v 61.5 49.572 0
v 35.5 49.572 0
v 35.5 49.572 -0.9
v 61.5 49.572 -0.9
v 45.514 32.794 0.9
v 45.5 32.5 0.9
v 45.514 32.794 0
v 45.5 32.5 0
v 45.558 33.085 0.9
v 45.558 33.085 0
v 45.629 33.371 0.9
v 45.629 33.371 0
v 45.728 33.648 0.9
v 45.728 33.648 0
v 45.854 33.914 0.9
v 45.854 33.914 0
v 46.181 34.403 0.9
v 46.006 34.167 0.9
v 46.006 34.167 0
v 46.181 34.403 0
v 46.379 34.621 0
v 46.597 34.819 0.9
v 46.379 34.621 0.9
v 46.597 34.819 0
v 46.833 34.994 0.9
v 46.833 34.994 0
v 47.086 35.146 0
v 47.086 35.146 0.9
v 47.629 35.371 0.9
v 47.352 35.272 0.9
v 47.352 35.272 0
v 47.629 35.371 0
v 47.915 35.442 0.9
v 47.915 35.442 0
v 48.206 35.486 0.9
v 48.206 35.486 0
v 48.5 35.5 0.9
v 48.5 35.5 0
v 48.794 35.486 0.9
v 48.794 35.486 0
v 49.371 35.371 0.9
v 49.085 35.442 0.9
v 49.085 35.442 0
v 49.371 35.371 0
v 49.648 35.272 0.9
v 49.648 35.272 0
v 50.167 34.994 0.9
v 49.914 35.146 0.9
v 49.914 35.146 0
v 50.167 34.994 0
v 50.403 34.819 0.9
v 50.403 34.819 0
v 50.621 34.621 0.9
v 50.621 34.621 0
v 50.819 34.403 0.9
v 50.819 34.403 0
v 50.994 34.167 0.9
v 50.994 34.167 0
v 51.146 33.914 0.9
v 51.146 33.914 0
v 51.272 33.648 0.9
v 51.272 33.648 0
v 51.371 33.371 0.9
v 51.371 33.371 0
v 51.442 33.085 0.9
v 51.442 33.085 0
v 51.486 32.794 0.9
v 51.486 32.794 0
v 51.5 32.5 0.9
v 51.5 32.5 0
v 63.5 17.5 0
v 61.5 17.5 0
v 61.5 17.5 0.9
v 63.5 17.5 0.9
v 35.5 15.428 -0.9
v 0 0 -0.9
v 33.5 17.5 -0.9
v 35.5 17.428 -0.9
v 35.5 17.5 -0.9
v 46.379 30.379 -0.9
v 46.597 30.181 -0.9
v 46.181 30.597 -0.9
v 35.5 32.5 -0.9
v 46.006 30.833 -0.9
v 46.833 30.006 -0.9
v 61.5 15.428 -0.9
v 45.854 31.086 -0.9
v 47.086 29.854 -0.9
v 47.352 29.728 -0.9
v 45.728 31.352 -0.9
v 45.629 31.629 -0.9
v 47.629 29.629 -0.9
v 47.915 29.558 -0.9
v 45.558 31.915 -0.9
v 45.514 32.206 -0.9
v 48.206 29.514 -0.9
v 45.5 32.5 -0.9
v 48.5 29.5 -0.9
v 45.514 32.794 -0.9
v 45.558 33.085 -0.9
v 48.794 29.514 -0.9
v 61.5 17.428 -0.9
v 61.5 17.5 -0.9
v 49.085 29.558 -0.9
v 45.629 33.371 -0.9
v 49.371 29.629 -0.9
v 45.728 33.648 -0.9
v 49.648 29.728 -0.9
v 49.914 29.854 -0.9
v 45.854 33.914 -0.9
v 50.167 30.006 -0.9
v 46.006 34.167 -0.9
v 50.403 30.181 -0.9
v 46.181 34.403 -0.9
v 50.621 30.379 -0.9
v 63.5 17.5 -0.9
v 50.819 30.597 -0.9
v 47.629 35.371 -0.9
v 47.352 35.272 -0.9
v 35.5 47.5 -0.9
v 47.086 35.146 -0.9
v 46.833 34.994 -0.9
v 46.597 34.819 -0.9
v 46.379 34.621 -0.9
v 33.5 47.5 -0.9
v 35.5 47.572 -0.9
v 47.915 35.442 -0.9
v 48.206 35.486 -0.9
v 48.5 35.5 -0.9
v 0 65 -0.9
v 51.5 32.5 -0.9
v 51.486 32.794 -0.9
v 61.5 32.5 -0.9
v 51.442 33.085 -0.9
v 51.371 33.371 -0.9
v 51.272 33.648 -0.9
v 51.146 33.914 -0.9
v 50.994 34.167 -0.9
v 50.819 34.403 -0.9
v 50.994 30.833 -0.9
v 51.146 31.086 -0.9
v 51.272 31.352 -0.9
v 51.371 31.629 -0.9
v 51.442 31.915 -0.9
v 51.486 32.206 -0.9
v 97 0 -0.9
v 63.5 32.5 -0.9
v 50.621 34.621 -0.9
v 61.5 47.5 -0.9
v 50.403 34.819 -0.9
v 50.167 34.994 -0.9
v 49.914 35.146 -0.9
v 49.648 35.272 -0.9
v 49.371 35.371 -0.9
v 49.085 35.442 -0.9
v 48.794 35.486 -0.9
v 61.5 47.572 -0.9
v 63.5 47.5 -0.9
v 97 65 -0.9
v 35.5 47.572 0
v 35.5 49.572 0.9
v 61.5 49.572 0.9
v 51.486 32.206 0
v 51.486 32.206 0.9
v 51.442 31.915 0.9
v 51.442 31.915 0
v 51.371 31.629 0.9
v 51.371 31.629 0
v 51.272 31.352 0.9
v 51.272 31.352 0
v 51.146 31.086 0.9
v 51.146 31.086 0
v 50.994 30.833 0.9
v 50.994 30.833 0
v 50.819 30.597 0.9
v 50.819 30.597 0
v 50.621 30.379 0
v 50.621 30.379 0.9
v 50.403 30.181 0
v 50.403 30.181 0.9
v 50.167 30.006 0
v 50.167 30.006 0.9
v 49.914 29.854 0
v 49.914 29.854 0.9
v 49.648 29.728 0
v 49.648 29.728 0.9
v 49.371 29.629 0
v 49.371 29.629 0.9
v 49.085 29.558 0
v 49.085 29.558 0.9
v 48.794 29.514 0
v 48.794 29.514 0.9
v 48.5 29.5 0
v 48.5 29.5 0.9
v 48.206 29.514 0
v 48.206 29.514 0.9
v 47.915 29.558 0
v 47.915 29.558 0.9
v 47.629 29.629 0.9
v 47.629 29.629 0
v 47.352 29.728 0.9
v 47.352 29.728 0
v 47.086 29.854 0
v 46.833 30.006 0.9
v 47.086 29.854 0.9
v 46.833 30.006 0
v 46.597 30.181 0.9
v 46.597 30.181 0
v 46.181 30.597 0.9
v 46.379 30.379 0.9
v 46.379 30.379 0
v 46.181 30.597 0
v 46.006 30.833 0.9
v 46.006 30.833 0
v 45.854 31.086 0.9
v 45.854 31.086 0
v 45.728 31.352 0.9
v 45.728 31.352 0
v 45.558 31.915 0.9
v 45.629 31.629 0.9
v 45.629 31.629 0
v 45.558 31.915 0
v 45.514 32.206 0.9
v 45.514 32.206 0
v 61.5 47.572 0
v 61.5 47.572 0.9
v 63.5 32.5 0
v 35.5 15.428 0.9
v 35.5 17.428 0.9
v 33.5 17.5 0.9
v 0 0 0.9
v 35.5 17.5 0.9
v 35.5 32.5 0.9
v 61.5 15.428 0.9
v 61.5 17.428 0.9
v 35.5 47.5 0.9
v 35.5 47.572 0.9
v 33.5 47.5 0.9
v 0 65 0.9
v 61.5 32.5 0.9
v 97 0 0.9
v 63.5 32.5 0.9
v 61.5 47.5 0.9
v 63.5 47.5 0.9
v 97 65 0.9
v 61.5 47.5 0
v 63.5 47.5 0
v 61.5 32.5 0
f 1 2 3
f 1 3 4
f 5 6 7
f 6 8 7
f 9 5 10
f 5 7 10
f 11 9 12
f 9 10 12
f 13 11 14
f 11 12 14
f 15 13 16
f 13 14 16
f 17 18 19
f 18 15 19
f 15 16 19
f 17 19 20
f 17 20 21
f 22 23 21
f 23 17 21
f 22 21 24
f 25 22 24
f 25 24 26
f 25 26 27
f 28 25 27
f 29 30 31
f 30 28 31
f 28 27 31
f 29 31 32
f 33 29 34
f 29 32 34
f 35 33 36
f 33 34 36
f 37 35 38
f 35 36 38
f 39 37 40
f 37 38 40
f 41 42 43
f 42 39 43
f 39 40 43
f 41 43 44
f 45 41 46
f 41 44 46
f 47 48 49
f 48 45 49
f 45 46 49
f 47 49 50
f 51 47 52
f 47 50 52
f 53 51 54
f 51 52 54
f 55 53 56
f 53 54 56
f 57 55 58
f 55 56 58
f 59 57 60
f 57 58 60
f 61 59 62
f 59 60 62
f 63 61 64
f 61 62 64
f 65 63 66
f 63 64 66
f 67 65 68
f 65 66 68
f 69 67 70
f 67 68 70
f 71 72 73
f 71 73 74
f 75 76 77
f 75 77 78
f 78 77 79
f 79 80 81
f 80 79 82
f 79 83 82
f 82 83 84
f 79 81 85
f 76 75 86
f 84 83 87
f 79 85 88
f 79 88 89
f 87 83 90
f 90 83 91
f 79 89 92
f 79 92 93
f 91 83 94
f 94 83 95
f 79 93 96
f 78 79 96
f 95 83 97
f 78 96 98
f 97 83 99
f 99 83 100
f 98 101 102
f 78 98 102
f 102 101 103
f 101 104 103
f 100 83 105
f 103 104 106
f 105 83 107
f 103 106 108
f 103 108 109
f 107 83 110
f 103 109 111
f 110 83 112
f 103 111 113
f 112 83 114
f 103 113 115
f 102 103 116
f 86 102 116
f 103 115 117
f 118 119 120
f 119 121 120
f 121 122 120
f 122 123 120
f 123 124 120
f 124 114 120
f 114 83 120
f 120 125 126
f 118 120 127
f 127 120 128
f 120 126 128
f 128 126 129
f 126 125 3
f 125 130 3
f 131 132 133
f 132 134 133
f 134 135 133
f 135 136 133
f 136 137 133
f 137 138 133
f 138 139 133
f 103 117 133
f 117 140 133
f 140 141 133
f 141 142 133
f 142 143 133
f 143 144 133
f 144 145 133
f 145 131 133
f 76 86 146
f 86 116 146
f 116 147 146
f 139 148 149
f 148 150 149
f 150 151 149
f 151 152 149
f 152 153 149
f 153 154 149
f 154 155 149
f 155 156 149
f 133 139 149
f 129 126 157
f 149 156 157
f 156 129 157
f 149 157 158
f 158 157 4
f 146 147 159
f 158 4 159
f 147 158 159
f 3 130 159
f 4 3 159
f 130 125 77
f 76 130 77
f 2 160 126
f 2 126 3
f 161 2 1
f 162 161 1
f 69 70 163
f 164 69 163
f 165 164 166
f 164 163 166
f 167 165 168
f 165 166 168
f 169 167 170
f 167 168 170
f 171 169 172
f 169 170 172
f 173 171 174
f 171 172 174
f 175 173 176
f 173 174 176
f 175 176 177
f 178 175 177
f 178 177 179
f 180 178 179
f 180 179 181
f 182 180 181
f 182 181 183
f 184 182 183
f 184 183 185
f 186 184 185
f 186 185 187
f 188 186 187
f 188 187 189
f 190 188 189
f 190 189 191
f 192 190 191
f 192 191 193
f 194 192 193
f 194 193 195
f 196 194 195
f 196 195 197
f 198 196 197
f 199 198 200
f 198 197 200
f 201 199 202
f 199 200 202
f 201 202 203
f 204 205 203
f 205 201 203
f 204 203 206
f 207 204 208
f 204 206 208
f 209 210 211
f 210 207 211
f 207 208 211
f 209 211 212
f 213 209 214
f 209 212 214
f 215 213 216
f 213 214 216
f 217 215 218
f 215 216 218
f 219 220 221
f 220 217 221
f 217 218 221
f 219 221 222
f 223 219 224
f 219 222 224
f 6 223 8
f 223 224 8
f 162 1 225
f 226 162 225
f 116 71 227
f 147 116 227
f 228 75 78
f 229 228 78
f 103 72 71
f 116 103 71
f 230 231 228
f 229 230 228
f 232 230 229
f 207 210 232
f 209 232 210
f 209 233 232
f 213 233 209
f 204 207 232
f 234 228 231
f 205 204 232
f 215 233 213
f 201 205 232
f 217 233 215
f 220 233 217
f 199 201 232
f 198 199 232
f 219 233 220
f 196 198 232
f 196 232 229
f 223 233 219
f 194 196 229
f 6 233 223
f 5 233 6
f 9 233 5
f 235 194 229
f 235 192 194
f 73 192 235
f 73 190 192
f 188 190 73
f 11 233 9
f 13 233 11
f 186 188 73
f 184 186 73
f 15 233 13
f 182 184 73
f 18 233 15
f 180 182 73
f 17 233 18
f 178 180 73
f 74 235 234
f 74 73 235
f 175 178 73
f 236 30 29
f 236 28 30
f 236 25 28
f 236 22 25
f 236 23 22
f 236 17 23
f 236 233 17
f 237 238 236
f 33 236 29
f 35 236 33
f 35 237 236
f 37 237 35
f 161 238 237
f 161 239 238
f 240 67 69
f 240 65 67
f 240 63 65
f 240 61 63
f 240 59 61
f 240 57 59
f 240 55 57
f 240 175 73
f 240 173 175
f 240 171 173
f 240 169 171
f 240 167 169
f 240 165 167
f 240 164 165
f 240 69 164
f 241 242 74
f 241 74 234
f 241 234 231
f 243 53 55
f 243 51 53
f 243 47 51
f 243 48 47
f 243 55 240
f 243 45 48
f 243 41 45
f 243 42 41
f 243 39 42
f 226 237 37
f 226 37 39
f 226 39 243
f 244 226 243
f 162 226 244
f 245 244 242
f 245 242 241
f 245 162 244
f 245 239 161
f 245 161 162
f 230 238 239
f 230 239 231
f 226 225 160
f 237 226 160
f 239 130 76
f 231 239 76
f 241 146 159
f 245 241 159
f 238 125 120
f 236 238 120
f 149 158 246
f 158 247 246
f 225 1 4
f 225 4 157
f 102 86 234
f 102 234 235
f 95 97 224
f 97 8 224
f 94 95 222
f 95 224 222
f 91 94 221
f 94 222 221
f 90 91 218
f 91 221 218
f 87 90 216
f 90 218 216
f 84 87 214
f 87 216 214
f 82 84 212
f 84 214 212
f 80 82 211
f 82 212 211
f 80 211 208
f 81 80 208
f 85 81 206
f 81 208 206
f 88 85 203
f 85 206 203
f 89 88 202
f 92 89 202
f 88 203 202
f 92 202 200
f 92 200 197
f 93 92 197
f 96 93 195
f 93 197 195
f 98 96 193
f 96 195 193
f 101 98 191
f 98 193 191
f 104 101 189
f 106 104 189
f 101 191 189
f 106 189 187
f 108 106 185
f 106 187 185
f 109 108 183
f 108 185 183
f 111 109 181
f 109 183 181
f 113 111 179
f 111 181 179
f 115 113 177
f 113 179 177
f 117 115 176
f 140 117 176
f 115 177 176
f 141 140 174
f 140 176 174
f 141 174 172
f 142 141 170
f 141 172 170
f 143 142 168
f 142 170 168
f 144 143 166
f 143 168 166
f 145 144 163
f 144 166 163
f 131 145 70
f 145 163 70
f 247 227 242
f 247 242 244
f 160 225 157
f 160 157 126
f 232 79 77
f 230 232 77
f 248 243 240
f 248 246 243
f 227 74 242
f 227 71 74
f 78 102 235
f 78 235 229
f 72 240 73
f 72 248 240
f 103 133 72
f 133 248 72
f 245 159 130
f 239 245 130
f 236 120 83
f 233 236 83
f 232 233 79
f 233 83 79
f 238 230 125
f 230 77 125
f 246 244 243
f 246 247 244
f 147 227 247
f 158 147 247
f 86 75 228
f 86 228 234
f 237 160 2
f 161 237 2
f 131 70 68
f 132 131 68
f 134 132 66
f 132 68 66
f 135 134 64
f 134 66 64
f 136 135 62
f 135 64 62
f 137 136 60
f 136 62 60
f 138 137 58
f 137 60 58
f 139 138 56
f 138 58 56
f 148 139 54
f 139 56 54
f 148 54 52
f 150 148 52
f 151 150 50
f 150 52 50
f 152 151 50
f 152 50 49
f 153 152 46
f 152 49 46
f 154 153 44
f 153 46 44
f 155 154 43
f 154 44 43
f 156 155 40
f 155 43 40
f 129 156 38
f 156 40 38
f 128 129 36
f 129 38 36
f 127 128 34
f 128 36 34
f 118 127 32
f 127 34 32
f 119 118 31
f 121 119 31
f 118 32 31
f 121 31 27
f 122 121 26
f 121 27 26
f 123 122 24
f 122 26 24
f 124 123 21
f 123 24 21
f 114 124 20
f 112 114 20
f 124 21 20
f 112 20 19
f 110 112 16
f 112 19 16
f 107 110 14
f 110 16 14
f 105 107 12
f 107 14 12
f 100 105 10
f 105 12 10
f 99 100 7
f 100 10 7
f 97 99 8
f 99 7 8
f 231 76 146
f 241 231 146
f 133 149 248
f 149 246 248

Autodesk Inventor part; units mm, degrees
ref_plane "YZ Plane" through (0, 0, 0) normal (1, 0, 0) x (0, 1, 0)
ref_plane "XZ Plane" through (0, 0, 0) normal (0, 1, 0) x (-1, 0, 0)
ref_plane "XY Plane" through (0, 0, 0) normal (0, 0, 1) x (1, 0, 0)
sketch "Sketch1" plane through (0, 0, 0) normal (0, 0, 1) x (1, 0, 0)
  line L0 (0, 0) -> (97, 0)
  line L1 (97, 0) -> (97, 65)
  line L2 (97, 65) -> (0, 65)
  line L3 (0, 65) -> (0, 0)
  circle A0 centre (48.5, 32.5) radius 3
  line L4 (63.5, 47.5) -> (61.5, 47.5)
  line L5 (61.5, 47.5) -> (61.5, 17.5)
  line L6 (61.5, 17.5) -> (63.5, 17.5)
  line L7 (63.5, 17.5) -> (63.5, 47.5)
  line L8 (33.5, 47.5) -> (35.5, 47.5)
  line L9 (35.5, 47.5) -> (35.5, 17.5)
  line L10 (35.5, 17.5) -> (33.5, 17.5)
  line L11 (33.5, 17.5) -> (33.5, 47.5)
  line L12 (35.5, 49.5718) -> (61.5, 49.5718)
  line L13 (61.5, 49.5718) -> (61.5, 47.5718)
  line L14 (61.5, 47.5718) -> (35.5, 47.5718)
  line L15 (35.5, 47.5718) -> (35.5, 49.5718)
  line L16 (48.5, 32.5) -> (31.2053, 32.5)
  line L17 (31.2053, 32.5) -> (48.5, 32.5)
  line L18 (48.5, 32.5) -> (67.3058, 32.5)
  line L19 (35.5, 15.4282) -> (61.5, 15.4282)
  line L20 (61.5, 17.4282) -> (35.5, 17.4282)
  line L21 (61.5, 15.4282) -> (61.5, 17.4282)
  line L22 (35.5, 15.4282) -> (35.5, 17.4282)
  point P0 (0, 32.5)
  point P1 (62.5, 47.5)
  dimension "d2" = 97
  dimension "d3" = 65
  dimension "d4" = 6
  dimension "d6" = 32.5
  dimension "d7" = 48.5
  dimension "d8" = 2
  dimension "d9" = 30
  dimension "d12" = 15
  dimension "d13" = 2
  dimension "d14" = 30
  dimension "d15" = 15
  dimension "d16" = 2
  dimension "d20" = 26
  dimension "d21" = 0
extrude "Extrusion1" add sketch "Sketch1" along normal mid plane 1.8
